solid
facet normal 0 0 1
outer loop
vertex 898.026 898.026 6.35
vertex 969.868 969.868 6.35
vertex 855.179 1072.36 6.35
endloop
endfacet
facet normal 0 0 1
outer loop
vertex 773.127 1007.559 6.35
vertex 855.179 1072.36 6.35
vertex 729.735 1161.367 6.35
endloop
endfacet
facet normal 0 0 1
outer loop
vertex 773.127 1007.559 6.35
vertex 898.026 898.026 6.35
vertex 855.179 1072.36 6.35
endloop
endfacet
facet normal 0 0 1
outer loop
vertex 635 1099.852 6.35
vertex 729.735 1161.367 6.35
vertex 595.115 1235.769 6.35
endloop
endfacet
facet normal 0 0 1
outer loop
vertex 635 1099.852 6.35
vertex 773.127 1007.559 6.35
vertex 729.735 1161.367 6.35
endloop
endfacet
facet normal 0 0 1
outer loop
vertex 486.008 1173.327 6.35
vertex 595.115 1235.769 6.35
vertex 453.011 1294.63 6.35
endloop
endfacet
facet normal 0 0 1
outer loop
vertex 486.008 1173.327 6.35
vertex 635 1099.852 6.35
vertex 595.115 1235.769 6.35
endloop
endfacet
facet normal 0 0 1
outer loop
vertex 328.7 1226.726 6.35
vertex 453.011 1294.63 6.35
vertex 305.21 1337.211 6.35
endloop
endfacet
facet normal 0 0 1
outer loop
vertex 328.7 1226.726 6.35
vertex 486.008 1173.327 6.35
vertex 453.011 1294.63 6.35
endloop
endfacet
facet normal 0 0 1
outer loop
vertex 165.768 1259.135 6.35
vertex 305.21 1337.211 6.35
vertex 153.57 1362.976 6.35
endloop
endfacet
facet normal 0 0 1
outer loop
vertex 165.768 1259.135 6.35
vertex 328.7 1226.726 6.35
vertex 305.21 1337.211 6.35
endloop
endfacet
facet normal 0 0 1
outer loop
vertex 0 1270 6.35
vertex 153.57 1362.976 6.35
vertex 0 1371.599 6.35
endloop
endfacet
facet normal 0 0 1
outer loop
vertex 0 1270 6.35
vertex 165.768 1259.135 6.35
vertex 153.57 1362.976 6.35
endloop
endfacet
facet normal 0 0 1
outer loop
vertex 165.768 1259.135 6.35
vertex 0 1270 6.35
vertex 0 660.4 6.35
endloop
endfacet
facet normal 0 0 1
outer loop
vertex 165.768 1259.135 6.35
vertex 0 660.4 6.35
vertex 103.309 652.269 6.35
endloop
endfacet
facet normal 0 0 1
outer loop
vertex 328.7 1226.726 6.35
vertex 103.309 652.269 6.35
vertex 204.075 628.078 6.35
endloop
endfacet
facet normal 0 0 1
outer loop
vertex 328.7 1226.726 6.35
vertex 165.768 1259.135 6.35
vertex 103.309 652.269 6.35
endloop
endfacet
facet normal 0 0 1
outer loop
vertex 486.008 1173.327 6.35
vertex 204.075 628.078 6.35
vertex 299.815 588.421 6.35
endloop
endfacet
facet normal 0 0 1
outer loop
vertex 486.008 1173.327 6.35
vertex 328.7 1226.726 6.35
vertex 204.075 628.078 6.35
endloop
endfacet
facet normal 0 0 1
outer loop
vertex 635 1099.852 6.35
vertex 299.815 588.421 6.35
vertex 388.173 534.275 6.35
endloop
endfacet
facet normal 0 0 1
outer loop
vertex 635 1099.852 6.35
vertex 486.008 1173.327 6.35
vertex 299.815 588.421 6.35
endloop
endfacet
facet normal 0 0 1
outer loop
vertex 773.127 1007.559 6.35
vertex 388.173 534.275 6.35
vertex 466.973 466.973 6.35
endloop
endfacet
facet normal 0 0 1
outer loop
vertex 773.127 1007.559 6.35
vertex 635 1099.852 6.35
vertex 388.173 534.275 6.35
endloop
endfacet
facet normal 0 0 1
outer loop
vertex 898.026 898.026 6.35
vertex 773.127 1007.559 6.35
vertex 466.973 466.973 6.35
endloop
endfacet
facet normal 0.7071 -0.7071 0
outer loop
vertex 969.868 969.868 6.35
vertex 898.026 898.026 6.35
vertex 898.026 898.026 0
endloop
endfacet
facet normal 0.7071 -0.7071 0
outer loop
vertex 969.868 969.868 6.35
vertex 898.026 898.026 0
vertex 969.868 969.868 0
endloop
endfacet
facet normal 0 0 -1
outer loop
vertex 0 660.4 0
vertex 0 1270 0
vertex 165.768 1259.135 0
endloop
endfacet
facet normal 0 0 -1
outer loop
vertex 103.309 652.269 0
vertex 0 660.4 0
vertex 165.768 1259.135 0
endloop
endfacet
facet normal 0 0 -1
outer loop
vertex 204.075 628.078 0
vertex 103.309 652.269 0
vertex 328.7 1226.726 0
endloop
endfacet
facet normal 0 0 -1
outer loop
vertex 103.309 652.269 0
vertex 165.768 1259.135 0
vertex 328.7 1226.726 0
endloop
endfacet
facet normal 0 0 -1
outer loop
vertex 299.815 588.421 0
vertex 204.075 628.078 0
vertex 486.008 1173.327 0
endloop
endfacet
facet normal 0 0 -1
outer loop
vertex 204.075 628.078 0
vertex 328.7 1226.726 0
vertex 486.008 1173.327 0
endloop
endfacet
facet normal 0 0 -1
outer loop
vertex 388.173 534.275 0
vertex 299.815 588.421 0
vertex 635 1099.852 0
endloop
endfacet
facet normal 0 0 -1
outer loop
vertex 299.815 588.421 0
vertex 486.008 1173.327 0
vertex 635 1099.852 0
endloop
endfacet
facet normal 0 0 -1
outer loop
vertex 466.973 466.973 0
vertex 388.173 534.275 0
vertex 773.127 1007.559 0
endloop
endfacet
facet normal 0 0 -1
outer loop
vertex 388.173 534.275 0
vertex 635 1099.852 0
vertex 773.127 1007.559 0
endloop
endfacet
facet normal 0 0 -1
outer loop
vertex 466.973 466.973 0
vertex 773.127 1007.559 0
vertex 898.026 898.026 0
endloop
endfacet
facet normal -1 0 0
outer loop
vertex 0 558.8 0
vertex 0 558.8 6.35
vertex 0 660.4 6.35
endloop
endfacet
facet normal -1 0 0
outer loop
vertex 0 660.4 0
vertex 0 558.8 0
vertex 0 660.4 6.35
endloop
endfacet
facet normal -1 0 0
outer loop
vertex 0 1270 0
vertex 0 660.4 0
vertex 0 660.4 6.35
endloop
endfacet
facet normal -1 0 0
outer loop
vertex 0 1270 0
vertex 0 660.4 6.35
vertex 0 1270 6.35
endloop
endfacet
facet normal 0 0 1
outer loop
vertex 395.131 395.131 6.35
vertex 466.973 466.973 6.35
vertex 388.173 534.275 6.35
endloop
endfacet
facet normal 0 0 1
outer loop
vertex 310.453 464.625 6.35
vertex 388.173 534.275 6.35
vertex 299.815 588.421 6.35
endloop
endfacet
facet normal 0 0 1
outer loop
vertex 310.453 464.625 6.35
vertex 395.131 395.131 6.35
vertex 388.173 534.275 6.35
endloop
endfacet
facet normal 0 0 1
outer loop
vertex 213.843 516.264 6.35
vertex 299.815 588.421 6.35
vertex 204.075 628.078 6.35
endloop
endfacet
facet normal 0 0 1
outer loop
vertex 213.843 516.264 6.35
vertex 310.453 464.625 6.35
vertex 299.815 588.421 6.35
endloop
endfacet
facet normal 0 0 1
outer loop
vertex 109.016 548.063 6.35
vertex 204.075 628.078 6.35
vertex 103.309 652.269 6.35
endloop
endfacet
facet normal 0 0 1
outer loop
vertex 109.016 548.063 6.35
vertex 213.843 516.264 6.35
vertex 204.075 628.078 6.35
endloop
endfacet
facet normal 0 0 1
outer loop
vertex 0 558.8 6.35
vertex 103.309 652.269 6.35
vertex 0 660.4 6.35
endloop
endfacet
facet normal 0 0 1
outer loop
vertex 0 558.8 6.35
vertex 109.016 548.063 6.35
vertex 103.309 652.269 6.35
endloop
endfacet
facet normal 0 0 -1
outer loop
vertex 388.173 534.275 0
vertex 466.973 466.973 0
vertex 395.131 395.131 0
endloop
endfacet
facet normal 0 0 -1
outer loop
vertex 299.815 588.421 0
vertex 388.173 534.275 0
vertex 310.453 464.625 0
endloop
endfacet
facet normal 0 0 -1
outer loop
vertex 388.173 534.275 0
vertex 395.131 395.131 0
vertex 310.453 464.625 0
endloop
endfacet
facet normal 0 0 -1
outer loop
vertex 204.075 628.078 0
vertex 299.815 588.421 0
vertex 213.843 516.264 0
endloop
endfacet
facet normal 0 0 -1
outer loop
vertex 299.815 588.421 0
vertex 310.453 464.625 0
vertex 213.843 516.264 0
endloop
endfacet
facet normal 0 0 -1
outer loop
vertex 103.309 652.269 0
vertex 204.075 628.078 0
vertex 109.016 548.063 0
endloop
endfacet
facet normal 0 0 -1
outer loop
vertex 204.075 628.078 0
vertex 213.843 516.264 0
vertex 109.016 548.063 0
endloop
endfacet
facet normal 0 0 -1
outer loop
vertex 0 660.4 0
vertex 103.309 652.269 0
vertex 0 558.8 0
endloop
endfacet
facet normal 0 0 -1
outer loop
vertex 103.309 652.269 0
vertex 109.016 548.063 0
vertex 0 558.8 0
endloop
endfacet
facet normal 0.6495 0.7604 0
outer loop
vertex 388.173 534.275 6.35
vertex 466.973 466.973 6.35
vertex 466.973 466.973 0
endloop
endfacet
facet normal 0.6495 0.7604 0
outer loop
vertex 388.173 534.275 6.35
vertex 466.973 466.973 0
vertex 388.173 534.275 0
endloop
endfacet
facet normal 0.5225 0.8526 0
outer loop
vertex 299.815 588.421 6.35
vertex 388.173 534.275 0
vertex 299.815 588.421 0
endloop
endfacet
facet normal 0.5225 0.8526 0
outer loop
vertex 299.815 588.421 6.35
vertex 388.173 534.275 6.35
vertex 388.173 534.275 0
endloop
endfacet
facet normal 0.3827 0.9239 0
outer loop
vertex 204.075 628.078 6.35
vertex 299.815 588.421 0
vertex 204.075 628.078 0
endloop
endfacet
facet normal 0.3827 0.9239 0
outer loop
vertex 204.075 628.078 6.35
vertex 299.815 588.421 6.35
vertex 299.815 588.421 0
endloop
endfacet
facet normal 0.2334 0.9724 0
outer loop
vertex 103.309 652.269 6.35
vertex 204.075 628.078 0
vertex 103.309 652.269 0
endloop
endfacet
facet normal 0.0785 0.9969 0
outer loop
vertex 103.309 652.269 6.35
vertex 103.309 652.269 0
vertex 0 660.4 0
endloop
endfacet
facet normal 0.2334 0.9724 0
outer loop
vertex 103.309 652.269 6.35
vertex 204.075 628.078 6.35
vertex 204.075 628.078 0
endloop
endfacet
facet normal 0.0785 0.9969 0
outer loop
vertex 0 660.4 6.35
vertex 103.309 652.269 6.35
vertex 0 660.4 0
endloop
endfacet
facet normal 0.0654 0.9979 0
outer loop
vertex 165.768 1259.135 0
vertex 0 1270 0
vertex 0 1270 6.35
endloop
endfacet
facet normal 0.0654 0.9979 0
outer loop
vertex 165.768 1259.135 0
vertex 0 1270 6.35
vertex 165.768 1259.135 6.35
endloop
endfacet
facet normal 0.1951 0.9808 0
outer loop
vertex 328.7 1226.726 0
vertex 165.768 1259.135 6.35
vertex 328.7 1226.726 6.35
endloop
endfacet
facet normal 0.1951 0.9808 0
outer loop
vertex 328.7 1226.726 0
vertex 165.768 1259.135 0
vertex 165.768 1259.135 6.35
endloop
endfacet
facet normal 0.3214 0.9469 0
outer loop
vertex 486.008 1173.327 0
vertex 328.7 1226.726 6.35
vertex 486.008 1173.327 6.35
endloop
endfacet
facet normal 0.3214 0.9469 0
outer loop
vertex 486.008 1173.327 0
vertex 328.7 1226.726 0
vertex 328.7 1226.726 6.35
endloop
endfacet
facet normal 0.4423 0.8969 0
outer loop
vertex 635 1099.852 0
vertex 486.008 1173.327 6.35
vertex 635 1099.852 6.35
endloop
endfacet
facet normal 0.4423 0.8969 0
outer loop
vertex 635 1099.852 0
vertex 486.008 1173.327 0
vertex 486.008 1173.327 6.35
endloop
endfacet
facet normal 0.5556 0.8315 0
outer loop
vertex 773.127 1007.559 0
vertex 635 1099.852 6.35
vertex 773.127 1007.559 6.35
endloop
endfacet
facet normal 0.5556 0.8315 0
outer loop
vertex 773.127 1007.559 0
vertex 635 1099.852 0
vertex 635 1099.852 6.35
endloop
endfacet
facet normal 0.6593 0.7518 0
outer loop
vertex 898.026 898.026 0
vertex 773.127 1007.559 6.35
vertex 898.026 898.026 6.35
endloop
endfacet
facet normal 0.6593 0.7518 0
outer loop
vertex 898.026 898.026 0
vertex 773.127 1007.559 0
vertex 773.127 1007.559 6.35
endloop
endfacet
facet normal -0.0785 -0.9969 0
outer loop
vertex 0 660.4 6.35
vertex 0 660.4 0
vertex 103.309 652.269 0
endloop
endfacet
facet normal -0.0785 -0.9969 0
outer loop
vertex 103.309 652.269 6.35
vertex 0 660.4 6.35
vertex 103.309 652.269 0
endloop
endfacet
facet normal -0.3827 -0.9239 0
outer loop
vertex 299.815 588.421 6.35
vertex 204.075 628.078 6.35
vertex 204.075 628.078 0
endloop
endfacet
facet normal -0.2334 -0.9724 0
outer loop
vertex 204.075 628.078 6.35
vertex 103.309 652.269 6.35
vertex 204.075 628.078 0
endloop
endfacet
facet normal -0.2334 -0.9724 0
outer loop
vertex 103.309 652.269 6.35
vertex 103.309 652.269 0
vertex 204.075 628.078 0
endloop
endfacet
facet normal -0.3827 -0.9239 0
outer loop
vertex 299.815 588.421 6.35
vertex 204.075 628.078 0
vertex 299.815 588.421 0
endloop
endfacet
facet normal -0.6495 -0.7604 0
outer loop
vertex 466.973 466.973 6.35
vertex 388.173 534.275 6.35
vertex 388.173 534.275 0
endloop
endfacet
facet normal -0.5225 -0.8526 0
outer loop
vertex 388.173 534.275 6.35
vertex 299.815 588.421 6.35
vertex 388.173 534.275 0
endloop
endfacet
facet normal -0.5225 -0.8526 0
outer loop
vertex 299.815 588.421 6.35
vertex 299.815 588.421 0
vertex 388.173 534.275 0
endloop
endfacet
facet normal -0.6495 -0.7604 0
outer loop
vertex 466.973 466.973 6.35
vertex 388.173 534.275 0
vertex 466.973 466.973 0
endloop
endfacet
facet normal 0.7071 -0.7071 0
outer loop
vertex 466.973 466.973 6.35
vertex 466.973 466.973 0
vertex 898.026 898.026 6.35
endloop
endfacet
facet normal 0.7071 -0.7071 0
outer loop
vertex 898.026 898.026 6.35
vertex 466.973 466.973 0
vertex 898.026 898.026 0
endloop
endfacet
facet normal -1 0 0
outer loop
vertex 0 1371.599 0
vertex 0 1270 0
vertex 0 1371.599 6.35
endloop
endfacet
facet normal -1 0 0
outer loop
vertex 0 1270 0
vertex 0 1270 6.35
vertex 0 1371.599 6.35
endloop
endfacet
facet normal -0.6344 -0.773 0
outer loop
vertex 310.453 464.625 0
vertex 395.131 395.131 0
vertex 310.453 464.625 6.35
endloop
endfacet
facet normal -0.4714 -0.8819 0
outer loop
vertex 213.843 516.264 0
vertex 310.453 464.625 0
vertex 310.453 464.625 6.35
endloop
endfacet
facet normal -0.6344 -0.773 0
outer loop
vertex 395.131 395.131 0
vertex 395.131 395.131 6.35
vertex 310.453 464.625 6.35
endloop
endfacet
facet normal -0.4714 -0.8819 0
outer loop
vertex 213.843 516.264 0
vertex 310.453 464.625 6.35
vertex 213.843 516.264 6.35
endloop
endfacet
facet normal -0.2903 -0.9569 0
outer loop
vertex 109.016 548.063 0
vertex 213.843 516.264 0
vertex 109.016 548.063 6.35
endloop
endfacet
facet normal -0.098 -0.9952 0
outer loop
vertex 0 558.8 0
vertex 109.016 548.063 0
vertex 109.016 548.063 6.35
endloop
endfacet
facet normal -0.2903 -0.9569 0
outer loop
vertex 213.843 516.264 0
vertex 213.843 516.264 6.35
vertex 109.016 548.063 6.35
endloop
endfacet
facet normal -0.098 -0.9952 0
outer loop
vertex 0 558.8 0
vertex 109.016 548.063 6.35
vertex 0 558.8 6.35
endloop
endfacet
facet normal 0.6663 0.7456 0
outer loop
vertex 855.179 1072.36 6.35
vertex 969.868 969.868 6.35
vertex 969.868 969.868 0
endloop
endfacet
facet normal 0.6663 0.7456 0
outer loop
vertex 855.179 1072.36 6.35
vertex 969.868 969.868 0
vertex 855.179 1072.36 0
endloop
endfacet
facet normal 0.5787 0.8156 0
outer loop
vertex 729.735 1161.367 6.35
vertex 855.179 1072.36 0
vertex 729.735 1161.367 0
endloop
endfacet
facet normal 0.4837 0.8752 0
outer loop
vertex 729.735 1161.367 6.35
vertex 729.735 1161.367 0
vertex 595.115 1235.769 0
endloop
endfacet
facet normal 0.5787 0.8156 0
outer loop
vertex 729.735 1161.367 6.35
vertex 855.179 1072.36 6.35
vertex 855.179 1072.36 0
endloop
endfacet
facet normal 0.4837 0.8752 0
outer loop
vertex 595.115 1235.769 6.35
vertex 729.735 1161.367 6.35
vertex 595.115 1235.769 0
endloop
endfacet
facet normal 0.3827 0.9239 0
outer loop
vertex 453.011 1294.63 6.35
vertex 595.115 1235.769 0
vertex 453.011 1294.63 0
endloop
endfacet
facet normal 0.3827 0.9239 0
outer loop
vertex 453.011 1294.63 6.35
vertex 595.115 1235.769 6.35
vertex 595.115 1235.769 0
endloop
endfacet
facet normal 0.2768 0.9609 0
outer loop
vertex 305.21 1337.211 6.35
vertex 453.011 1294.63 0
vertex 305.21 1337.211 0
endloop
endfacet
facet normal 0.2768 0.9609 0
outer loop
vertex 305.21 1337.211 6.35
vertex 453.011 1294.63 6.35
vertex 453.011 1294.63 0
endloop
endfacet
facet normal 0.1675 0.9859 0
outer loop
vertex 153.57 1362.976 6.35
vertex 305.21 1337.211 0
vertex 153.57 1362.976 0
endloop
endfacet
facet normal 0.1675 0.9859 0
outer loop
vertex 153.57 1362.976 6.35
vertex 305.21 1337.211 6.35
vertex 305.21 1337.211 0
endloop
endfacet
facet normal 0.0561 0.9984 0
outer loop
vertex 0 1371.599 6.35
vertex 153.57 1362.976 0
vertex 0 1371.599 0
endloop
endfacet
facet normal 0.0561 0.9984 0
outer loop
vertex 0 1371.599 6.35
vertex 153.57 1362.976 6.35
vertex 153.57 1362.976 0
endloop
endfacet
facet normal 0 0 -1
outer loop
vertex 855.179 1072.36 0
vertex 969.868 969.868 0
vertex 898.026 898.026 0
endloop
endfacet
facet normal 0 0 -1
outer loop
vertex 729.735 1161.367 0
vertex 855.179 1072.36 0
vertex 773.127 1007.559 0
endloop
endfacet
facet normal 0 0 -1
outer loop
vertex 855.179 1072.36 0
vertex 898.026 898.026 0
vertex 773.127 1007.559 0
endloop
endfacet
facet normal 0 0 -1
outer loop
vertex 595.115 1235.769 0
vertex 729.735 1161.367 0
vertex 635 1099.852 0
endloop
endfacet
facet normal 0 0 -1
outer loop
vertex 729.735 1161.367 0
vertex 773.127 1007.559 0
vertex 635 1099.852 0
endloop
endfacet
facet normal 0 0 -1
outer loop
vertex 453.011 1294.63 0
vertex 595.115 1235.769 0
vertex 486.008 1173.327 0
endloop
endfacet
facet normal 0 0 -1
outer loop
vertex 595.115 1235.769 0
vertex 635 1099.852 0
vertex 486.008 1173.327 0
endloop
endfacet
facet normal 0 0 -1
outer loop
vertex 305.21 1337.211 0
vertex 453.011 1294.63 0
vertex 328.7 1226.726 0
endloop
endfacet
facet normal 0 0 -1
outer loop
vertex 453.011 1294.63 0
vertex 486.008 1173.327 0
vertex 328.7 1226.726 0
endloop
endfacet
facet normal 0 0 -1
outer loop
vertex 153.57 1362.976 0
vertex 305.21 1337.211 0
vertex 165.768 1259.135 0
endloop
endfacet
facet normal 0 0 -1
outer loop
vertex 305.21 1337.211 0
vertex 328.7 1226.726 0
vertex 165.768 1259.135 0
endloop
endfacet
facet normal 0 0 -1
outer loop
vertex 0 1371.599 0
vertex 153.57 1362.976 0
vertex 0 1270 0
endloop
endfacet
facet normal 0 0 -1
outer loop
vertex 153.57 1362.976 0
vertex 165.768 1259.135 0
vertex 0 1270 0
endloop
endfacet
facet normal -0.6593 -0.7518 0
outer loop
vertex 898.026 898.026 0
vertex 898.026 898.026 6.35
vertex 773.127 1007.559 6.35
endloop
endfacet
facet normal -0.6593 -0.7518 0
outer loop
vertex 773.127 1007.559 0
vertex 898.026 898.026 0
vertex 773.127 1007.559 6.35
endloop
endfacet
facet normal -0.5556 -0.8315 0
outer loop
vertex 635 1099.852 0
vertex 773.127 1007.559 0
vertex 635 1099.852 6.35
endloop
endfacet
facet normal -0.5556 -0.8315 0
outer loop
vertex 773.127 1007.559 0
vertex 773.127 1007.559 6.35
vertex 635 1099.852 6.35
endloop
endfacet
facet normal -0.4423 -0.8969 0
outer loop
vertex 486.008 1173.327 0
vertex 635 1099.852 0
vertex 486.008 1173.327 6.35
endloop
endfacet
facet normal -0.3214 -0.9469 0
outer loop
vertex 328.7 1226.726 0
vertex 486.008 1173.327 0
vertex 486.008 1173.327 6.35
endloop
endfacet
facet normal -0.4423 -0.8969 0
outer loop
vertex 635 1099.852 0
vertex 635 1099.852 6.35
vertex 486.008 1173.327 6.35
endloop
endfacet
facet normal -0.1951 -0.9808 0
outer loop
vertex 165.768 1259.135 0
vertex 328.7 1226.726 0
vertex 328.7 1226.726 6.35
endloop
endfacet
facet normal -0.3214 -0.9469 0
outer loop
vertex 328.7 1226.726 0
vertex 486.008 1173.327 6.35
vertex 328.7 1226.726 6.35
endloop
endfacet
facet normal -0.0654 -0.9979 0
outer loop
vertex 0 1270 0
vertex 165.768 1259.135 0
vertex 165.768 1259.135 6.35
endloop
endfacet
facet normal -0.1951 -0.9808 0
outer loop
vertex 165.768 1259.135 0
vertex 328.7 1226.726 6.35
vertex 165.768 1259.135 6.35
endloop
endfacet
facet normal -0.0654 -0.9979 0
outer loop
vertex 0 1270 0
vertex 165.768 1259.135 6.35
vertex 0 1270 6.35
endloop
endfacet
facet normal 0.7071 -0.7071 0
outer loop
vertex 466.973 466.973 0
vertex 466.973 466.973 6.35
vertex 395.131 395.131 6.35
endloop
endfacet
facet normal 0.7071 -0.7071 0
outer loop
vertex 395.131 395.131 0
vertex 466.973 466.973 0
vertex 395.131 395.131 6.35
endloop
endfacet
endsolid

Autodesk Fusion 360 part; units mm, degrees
sketch "Sketch1" plane through (0, 0, 0) normal (0, 0, 1) x (1, 0, 0)
  circle A0 centre (0, 0) radius 660.4
  circle A1 centre (0, 0) radius 1270
  line L0 (0, 0) -> (0, 1270)
  line L1 (0, 0) -> (1270, 0)
  line L2 (0, 0) -> (898.0256, 898.0256)
  line L3 (0, 0) -> (1270, 0) construction
  dimension "d1" = 1320.8
  dimension "d2" = 609.6
  dimension "d3" = 45
extrude "Extrude1" add sketch "Sketch1" along normal blind 6.35 contours A0 A1 L0 L2 makes body 1
sketch "Sketch2" plane through (0, 0, 6.35) normal (0, 0, 1) x (-1, 0, 0)
  line L0 (-466.9733, -466.9733) -> (-898.0256, -898.0256)
  arc A0 (-898.0256, -898.0256) -> (0, -1270) centre (0, 0) ccw
  line L1 (0, -1270) -> (0, -660.4)
  arc A1 (-466.9733, -466.9733) -> (0, -660.4) centre (0, 0) ccw
  line L2 (101.6, -1367.8319) -> (101.6, -549.486)
  arc A2 (-460.3873, -316.7032) -> (101.6, -549.486) centre (0, 0) ccw
  line L3 (-460.3873, -316.7032) -> (-1039.0452, -895.3611)
  arc A3 (-1039.0452, -895.3611) -> (101.6, -1367.8319) centre (0, 0) ccw
  line L4 (101.6, -549.486) -> (0, -549.486)
  line L5 (0, -549.486) -> (0, -1371.5989)
  line L6 (0, -1371.5989) -> (101.6, -1371.5989)
  line L7 (101.6, -1371.5989) -> (101.6, -549.486)
  line L8 (-466.9733, -466.9733) -> (-395.1313, -395.1313)
  line L9 (-898.0256, -898.0256) -> (-969.8677, -969.8677)
  dimension "d6" = -101.6
  dimension "d7" = 101.6
extrude "Extrude1'" add sketch "Sketch2" against normal blind 6.35 separate body contours A1 A2 L5 L8 | A0 A3 L5 L9 makes body 2 at (53.0458, 623.0565, 6.35) makes body 3 at (565.5655, 1209.4535, 6.35) in component "45"
copy_body "CutPasteBodies1" bodies 1 removing the originals makes body 4 in component "45"
component "45" placed x (1, 0, 0) y (0, 1, 0) z (0, 0, 1) at (0, 0, 0)
